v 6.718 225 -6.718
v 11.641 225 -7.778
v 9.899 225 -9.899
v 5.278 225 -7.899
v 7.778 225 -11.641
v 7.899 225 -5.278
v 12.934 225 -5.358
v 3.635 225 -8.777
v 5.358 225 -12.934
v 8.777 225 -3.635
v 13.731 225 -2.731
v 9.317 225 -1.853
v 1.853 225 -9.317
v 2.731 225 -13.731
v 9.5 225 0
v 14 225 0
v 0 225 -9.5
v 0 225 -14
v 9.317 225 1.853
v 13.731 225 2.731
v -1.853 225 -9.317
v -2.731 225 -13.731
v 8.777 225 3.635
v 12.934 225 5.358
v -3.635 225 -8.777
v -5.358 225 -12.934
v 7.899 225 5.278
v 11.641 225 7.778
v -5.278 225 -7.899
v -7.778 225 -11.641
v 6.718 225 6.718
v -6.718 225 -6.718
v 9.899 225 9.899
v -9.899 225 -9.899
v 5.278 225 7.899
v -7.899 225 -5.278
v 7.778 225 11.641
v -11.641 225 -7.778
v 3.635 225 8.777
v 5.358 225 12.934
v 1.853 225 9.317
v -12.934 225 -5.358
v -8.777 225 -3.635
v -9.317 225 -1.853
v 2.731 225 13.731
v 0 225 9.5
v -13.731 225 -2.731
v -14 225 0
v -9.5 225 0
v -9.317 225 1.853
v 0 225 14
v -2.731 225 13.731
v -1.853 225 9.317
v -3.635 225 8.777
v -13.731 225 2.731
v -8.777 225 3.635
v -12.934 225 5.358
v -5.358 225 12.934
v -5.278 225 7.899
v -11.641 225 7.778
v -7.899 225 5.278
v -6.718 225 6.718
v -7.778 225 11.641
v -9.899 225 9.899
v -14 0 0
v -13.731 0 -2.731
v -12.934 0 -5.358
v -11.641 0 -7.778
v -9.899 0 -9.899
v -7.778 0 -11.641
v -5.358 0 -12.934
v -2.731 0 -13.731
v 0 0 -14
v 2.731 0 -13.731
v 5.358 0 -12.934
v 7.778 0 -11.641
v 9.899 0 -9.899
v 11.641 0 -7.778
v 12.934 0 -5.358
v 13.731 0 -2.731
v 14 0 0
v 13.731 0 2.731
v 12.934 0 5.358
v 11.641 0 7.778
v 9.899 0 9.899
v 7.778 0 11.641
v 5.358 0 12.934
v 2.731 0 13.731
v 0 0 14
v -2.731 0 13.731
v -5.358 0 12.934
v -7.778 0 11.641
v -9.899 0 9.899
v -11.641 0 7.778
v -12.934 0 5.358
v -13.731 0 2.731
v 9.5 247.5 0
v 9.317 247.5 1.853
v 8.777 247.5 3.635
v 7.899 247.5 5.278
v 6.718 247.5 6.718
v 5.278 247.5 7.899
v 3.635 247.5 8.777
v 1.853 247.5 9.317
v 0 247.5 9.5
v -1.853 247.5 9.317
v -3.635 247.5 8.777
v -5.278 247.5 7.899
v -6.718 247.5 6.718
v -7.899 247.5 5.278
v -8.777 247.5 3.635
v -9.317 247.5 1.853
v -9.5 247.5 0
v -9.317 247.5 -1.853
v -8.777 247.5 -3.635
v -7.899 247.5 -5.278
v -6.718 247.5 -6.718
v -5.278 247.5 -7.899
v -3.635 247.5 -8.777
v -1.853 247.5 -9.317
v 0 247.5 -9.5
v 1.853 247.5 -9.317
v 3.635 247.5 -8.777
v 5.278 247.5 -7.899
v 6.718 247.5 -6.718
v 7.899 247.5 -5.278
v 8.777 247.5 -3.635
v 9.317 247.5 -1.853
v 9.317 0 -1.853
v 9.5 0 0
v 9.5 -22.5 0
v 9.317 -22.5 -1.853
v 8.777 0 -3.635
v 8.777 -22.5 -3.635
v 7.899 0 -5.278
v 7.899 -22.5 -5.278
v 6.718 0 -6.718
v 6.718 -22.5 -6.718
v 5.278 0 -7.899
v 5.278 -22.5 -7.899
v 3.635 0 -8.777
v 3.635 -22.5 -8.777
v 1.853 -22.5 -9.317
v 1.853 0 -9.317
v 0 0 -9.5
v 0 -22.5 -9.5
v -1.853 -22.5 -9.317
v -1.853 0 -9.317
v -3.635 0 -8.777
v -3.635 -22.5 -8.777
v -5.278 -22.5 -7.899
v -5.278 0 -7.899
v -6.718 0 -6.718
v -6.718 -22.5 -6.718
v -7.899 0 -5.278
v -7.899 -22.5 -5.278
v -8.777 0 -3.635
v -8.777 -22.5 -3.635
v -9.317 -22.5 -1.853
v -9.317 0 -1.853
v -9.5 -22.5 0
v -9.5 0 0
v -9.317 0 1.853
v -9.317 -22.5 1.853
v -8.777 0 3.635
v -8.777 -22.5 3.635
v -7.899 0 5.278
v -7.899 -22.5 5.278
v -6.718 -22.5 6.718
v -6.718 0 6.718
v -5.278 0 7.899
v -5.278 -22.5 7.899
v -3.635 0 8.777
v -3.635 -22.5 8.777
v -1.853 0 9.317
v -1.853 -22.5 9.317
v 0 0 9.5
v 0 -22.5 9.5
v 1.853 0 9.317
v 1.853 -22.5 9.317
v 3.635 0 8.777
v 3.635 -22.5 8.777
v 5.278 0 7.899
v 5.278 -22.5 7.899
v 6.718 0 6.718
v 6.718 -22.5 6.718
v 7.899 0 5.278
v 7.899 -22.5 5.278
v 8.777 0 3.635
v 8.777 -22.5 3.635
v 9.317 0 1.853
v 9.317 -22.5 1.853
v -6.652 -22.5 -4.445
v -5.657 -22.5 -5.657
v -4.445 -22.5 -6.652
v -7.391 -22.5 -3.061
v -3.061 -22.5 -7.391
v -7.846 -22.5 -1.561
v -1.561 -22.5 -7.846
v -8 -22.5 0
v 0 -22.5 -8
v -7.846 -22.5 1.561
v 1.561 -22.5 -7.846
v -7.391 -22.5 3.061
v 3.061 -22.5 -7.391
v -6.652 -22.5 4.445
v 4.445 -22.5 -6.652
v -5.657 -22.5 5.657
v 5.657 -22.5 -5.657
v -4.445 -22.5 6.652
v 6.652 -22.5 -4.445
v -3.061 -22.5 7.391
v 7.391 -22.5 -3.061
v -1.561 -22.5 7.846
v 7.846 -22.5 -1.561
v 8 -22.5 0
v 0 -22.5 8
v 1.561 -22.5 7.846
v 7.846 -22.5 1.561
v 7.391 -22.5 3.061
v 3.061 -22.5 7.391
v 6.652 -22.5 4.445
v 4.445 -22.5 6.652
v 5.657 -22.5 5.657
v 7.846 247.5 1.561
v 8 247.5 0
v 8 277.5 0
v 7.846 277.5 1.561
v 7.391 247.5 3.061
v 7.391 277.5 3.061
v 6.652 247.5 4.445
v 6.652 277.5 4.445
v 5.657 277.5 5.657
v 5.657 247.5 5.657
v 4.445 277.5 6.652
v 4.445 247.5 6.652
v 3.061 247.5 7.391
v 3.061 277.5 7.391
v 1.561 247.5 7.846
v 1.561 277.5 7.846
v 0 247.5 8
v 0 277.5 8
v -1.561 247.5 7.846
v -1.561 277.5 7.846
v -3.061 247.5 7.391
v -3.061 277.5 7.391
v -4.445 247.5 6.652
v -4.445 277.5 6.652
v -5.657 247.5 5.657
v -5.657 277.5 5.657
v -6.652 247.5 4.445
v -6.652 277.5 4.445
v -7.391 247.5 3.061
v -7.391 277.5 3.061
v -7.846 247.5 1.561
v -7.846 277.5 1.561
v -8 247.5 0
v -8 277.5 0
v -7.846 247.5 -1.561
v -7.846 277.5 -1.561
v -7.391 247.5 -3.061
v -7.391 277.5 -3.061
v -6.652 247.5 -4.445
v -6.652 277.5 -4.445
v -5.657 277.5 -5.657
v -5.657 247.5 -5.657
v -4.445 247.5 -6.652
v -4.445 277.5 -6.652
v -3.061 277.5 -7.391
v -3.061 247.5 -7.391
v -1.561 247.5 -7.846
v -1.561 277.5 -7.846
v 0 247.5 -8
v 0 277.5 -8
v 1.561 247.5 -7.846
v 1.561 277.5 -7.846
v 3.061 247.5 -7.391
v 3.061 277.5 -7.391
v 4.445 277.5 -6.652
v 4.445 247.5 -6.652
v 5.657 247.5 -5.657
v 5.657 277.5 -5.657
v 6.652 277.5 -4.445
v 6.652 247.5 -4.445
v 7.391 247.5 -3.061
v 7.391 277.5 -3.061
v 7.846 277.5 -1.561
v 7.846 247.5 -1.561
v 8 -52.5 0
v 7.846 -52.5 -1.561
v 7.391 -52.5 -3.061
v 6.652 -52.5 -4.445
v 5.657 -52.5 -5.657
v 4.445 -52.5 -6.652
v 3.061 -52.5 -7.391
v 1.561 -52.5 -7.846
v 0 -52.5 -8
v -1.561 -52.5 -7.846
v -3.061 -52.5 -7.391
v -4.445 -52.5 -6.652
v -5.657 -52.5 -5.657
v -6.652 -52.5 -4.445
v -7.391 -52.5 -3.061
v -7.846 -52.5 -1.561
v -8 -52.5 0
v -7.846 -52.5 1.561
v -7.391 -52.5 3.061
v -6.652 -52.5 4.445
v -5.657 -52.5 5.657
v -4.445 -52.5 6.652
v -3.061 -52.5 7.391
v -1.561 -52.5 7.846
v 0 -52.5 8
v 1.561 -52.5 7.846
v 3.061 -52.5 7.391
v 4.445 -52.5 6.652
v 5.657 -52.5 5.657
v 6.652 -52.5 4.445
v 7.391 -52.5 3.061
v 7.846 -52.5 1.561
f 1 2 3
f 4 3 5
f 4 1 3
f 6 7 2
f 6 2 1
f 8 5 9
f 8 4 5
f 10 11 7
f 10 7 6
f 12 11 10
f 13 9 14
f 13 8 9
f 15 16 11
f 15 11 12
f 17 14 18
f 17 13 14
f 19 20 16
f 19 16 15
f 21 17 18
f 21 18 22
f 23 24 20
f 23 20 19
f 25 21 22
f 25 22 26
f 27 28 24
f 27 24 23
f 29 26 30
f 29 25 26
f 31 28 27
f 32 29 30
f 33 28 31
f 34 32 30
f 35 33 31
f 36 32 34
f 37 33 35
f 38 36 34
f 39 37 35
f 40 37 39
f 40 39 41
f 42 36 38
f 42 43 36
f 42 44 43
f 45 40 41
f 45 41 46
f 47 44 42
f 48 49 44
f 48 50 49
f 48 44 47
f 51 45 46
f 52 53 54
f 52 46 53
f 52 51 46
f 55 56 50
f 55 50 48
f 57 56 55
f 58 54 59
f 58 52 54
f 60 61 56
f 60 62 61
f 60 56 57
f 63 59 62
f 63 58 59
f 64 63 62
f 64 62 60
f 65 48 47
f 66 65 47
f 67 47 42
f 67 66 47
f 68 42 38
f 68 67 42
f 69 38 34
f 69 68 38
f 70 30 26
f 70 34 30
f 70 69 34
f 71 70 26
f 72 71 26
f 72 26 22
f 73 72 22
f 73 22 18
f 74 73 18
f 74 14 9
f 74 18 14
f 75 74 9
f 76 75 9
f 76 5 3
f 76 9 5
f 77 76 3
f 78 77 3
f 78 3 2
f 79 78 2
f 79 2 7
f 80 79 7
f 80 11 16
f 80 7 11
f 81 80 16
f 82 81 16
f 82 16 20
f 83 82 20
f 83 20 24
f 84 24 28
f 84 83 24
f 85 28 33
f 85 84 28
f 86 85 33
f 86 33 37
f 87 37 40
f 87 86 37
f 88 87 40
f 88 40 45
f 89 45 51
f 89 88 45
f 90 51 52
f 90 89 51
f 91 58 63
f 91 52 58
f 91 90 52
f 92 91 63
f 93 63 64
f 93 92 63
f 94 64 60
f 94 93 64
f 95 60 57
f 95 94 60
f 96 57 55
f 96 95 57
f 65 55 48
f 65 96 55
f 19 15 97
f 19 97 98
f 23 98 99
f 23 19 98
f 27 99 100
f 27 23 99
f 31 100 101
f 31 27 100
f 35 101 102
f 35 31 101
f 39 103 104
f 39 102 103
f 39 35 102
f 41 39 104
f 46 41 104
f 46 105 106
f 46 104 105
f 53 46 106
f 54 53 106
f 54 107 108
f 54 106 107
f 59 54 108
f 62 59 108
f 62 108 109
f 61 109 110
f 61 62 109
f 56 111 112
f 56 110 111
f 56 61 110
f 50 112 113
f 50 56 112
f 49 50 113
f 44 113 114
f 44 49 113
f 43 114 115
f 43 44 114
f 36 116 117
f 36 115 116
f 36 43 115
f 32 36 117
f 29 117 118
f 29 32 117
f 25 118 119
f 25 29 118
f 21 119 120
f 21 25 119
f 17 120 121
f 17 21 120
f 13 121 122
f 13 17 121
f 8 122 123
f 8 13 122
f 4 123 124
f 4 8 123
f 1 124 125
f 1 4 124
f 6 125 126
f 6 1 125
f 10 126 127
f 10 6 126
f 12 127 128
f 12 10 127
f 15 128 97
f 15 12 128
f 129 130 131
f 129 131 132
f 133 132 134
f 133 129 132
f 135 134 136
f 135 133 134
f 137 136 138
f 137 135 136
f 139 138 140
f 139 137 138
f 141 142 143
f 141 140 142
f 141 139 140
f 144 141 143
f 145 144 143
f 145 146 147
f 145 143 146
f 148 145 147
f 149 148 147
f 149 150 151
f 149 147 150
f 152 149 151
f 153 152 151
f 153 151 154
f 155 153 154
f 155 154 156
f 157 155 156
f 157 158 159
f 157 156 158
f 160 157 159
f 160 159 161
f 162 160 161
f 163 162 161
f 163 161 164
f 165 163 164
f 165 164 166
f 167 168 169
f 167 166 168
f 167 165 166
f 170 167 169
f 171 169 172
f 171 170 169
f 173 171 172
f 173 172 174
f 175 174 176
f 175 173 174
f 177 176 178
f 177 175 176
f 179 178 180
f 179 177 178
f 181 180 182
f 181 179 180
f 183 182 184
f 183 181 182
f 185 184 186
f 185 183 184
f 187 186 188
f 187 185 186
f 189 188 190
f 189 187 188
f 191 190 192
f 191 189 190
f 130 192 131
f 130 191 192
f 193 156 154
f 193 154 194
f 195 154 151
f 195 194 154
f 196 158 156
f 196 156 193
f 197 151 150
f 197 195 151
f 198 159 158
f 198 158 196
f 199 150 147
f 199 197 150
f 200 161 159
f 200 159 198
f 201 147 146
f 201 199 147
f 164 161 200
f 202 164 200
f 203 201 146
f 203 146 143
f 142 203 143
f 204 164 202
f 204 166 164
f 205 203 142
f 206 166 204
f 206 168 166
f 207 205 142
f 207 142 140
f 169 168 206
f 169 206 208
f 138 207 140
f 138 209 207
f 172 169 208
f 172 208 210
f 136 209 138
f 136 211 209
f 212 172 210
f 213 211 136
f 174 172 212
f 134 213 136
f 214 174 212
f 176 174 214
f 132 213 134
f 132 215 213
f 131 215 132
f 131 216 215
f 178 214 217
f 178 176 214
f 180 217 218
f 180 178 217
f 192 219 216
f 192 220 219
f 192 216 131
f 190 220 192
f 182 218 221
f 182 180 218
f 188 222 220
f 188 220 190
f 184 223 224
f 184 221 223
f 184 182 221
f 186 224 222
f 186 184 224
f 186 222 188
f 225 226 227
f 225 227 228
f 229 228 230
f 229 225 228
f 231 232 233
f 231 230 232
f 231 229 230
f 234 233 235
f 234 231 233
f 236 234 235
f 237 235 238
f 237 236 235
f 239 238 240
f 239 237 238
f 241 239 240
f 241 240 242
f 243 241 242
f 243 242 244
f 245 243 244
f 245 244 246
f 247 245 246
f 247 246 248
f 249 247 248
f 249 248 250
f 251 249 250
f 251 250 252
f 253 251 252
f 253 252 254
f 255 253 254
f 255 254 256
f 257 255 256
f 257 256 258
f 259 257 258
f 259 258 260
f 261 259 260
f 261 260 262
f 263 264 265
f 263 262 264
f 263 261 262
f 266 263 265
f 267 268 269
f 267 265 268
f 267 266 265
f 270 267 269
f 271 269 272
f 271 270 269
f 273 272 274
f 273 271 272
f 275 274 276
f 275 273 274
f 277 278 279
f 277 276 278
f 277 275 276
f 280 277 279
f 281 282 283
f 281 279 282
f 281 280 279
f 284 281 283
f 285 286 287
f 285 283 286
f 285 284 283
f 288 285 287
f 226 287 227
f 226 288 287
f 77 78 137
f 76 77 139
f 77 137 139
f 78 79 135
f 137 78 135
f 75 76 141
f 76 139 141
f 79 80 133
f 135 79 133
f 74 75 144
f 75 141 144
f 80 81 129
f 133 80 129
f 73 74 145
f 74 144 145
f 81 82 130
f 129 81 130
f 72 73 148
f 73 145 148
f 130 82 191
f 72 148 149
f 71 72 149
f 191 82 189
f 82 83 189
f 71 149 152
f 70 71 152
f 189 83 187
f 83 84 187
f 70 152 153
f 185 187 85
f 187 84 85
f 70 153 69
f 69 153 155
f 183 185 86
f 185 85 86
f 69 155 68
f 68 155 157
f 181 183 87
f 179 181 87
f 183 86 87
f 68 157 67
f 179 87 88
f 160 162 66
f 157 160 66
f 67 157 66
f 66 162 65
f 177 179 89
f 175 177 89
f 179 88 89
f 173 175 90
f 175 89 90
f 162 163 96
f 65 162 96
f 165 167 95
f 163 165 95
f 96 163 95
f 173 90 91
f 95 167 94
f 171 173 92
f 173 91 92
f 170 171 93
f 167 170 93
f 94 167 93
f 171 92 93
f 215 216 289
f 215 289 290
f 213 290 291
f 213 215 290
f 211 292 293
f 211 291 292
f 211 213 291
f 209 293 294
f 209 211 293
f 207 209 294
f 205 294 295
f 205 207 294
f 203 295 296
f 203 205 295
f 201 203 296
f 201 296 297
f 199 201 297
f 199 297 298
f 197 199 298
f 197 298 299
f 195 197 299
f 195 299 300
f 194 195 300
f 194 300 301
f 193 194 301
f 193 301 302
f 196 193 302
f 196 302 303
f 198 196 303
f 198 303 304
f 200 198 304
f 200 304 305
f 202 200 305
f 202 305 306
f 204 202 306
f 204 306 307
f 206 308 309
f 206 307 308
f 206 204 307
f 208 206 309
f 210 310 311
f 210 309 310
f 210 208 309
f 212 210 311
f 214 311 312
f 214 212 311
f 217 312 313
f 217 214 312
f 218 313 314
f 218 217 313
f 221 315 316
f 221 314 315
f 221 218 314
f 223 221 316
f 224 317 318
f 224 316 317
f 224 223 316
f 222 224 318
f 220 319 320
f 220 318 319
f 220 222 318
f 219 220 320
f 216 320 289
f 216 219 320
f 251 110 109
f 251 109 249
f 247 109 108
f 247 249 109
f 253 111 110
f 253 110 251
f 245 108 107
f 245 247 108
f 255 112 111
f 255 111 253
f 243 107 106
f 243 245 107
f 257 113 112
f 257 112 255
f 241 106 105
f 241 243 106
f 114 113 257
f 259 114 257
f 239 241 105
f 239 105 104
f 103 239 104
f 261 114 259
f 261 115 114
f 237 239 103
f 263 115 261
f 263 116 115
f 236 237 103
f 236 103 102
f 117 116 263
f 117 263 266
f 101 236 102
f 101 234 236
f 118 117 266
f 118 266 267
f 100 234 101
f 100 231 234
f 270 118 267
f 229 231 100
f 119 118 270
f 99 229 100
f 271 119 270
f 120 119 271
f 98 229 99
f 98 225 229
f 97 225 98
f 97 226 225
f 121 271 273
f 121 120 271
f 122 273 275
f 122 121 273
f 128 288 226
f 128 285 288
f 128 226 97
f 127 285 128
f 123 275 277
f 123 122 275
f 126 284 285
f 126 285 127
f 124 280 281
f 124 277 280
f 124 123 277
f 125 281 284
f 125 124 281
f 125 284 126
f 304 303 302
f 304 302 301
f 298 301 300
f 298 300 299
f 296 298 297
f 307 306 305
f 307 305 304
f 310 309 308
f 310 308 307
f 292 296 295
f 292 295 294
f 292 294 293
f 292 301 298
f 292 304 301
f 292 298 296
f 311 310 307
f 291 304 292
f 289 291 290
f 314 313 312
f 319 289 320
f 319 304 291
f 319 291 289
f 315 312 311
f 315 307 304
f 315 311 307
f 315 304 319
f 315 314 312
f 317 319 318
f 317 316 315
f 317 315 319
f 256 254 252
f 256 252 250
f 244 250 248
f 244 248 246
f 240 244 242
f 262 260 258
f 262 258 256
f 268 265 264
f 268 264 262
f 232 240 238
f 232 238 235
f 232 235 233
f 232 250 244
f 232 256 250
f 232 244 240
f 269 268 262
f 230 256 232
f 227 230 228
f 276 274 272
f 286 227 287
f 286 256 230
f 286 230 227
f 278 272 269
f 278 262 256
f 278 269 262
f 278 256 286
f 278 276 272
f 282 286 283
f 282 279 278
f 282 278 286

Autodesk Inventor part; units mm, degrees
ref_plane "YZ Plane" through (0, 0, 0) normal (1, 0, 0) x (0, 1, 0)
ref_plane "XZ Plane" through (0, 0, 0) normal (0, 1, 0) x (-1, 0, 0)
ref_plane "XY Plane" through (0, 0, 0) normal (0, 0, 1) x (1, 0, 0)
sketch "Sketch1" plane through (0, 0, 0) normal (0, 1, 0) x (-1, 0, 0)
  circle A0 centre (0, 0) radius 14
  dimension "d0" = 28
extrude "Extrusion1" add sketch "Sketch1" along normal blind 225
sketch "Sketch2" plane through (0, 225, 0) normal (0, 1, 0) x (1, 0, 0)
  circle A0 centre (0, 0) radius 9.5
  dimension "d3" = 19
extrude "Extrusion2" add sketch "Sketch2" along normal blind 22.5
sketch "Sketch3" plane through (0, 247.5, 0) normal (0, 1, 0) x (1, 0, 0)
  circle A0 centre (0, 0) radius 9.5 projected
  circle A1 centre (0, 0) radius 8
  dimension "d6" = 16
extrude "Extrusion3" add sketch "Sketch3" along normal blind 30 contours A1
thread "Thread1" size "M16x1" class "6g" standard "ANSI Metric M Profile" full length
sketch "Sketch4" plane through (0, 0, 0) normal (0, -1, 0) x (1, 0, 0)
  circle A0 centre (0, 0) radius 9.5
extrude "Extrusion4" add sketch "Sketch4" along normal blind 22.5
sketch "Sketch5" plane through (0, -22.5, 0) normal (0, -1, 0) x (1, 0, 0)
  circle A0 centre (0, 0) radius 8
extrude "Extrusion5" add sketch "Sketch5" along normal blind 30
thread "Thread2" size "M16x1" class "6g" standard "ANSI Metric M Profile" full length
properties part number "tie rolls"
